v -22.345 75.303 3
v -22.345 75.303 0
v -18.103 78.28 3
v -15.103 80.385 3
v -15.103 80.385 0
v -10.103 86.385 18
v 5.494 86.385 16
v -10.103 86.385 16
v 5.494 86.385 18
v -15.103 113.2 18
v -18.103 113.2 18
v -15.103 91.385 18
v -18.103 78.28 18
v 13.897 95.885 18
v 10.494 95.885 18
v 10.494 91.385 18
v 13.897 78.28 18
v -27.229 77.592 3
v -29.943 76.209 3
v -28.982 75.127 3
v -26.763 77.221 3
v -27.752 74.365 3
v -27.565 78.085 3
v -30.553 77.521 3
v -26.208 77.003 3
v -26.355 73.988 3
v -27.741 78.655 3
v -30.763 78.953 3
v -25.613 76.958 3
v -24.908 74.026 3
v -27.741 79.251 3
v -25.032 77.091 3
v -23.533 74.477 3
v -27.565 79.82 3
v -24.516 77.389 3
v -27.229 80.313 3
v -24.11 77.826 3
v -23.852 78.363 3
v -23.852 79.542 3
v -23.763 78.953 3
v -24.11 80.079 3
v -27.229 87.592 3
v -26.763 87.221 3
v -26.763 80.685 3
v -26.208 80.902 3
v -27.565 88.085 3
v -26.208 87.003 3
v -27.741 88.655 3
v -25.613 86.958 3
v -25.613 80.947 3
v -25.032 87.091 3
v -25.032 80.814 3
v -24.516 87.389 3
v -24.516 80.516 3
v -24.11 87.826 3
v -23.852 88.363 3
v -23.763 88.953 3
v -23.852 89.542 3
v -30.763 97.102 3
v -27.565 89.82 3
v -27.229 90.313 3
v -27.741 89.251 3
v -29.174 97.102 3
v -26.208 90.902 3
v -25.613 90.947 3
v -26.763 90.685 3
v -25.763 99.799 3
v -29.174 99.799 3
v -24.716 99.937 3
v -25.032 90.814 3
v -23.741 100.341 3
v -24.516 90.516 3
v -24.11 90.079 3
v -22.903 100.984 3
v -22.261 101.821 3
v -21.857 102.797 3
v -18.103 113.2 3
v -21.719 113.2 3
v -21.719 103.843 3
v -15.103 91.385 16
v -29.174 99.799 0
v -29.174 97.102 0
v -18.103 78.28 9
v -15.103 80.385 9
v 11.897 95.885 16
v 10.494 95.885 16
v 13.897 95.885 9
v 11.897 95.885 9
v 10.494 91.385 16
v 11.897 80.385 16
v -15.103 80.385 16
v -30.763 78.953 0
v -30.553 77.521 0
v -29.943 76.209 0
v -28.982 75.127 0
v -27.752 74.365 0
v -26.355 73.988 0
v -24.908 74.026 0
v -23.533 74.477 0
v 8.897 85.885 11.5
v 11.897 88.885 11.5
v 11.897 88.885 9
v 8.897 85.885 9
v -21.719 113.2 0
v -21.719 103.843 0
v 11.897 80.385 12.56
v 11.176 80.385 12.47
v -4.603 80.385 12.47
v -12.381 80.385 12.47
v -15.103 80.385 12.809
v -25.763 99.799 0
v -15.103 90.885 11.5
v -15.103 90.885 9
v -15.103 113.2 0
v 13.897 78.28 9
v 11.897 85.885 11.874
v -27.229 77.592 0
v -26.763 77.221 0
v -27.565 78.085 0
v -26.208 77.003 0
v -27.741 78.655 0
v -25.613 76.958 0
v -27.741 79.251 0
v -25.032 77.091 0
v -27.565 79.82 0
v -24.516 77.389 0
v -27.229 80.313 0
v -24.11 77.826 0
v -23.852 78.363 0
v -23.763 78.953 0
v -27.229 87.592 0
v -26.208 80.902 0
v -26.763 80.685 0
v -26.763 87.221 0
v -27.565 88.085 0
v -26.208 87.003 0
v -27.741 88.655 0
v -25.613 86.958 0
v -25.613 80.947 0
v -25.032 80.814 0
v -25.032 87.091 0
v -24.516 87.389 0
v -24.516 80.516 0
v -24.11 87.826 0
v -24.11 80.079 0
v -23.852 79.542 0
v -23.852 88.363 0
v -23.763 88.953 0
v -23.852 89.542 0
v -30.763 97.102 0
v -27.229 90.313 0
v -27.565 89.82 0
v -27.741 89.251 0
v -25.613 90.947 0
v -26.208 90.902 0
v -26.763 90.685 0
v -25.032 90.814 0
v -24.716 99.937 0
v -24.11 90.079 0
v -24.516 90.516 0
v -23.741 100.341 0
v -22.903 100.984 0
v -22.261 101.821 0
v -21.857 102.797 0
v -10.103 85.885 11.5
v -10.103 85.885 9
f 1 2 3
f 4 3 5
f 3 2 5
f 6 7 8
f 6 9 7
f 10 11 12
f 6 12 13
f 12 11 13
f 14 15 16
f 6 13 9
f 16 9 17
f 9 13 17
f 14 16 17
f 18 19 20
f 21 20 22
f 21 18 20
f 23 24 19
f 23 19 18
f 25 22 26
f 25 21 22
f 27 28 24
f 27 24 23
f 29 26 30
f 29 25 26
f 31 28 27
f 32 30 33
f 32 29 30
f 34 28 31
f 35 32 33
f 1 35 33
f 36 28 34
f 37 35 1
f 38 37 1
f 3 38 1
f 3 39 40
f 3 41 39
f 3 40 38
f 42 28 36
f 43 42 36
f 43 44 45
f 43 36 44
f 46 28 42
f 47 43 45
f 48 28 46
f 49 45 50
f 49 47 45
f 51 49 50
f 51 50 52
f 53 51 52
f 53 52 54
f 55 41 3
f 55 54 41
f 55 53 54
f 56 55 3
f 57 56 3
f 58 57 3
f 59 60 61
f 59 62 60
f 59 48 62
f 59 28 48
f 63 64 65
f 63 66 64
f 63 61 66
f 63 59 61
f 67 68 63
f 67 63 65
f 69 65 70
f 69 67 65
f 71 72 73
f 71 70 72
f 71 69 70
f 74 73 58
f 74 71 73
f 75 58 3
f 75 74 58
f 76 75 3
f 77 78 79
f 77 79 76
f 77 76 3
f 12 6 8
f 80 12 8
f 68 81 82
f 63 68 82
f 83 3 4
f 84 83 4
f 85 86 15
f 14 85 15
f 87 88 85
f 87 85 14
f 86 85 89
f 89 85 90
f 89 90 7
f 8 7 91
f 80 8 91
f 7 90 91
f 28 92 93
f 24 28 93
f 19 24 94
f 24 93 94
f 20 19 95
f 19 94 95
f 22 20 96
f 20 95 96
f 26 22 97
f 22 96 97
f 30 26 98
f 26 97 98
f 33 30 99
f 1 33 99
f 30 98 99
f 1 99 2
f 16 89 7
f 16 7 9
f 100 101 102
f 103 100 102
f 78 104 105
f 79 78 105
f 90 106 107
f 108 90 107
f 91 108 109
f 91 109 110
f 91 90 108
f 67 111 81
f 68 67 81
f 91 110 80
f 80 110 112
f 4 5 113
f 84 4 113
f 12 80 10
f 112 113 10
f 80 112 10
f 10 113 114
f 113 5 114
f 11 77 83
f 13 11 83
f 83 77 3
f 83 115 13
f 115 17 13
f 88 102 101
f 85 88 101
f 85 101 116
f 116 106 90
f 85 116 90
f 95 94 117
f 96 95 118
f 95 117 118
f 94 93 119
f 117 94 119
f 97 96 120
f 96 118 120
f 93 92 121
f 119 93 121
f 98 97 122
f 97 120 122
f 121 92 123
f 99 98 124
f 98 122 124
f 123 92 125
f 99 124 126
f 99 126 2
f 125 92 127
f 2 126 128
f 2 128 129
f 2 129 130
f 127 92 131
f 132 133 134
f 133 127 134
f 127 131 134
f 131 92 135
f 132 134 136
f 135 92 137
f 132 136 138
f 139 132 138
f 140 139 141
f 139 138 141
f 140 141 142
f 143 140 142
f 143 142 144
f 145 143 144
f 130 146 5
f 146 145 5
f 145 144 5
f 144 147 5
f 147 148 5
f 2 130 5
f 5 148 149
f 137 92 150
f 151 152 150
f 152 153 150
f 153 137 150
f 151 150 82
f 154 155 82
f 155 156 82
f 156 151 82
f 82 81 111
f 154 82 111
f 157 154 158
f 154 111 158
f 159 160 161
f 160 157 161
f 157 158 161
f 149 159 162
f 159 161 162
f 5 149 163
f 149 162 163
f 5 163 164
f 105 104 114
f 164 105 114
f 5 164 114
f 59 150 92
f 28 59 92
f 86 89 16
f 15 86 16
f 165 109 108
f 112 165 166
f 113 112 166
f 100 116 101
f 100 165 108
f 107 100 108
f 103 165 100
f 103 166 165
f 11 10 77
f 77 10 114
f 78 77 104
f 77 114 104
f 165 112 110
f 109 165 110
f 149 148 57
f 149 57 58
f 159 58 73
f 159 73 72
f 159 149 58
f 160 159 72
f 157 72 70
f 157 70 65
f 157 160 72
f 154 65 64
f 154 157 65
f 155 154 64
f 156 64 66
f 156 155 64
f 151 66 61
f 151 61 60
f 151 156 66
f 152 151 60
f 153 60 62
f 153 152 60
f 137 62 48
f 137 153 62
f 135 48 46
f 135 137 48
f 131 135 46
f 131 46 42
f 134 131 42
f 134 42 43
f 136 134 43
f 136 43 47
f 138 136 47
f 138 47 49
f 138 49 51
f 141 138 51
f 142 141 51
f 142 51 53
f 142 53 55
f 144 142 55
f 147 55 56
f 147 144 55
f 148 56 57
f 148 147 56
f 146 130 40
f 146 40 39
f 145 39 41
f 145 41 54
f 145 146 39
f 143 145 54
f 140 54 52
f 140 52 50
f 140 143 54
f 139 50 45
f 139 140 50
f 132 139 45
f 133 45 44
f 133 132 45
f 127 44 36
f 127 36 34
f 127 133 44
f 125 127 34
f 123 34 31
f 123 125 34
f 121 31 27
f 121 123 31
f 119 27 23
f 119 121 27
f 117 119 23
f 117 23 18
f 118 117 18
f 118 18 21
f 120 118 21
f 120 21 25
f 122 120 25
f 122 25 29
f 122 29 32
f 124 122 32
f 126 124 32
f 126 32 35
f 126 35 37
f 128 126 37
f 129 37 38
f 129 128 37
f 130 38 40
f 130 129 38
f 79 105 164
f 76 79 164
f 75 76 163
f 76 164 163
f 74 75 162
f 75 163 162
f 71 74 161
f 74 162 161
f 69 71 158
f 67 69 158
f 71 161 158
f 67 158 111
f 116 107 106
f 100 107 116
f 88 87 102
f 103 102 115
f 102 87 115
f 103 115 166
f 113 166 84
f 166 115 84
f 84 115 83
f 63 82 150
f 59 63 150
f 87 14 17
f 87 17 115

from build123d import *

# Parameters (mm, degrees)
SKETCH_1_R       = 2
EXTRUDE_1_DEPTH  = 3
EXTRUDE_2_DEPTH  = 15
SKETCH_3_W       = 2
SKETCH_3_H       = 6
EXTRUDE_3_DEPTH  = 29
SKETCH_5_W       = 2
SKETCH_5_H       = 6
EXTRUDE_4_DEPTH  = 7
SKETCH_6_W       = 32
SKETCH_6_H       = 7
EXTRUDE_5_DEPTH  = 2
CHAMFER_1_SIZE   = 5
SKETCH_8_W       = 32
SKETCH_8_H       = 2.104912686
EXTRUDE_6_DEPTH  = 7
SKETCH_9_W       = 27
SKETCH_9_H       = 4.5
EXTRUDE_7_DEPTH  = 5.5
CHAMFER_2_SIZE   = 5
EXTRUDE_8_DEPTH  = 9.5
CHAMFER_3_SIZE   = 5
CHAMFER_4_SIZE   = 3
CHAMFER_6_SIZE   = 2
CHAMFER_6_SIZE_2 = 11.342563639


with BuildPart() as part:
    # 草图1 → 凸台-拉伸1 (new body)
    with BuildSketch(Plane.XY):
        with BuildLine():
            Line((-22.344972157, 75.303248777), (-15.102670088, 80.384719944))
            Line((-15.102670088, 80.384719944), (-15.102670088, 113.200215401))
            Line((-15.102670088, 113.200215401), (-21.718999147, 113.200215401))
            Line((-21.718999147, 113.200215401), (-21.718999147, 103.843357559))
            ThreePointArc((-21.718999147, 103.843357559), (-22.903426745, 100.983896387), (-25.762887917, 99.799468789))
            Line((-25.762887917, 99.799468789), (-29.17448261, 99.799468789))
            Line((-29.17448261, 99.799468789), (-29.17448261, 97.102223458))
            Line((-29.17448261, 97.102223458), (-30.762887917, 97.102223458))
            Line((-30.762887917, 97.102223458), (-30.762887917, 88.952611989))
            Line((-30.762887917, 88.952611989), (-30.762887917, 78.952611989))
            ThreePointArc((-30.762887917, 78.952611989), (-27.751659045, 74.365151973), (-22.344972157, 75.303248777))
        make_face()
        with Locations((-25.762887917, 88.952611989)):
            Circle(SKETCH_1_R, mode=Mode.SUBTRACT)
        with Locations((-25.762887917, 78.952611989)):
            Circle(SKETCH_1_R, mode=Mode.SUBTRACT)
    extrude(amount=EXTRUDE_1_DEPTH)

    # 草图2 → 凸台-拉伸2 (add)
    with BuildSketch(Plane.XY.offset(3)):
        Polygon((-18.102670088, 80.384719944), (-18.102670088, 78.279807258), (-15.102670088, 80.384719944), (-15.102670088, 113.200215401), (-18.102670088, 113.200215401), align=None)
    extrude(amount=EXTRUDE_2_DEPTH)

    # 草图3 → 凸台-拉伸3 (add)
    with BuildSketch(Plane(origin=(-15.102670088, 0, 0), x_dir=(0, 0, -1), z_dir=(1, 0, 0))):
        with Locations((-17, 83.384719944)):
            Rectangle(SKETCH_3_W, SKETCH_3_H)
    extrude(amount=EXTRUDE_3_DEPTH)

    # 草图5 → 凸台-拉伸4 (add)
    with BuildSketch(Plane(origin=(0, 0, 16), x_dir=(-1, 0, 0), z_dir=(0, 0, -1))):
        with Locations((-12.897329912, 83.384719944)):
            Rectangle(SKETCH_5_W, SKETCH_5_H)
    extrude(amount=EXTRUDE_4_DEPTH)

    # 草图6 → 凸台-拉伸5 (add)
    with BuildSketch(Plane.XY.offset(18)):
        with Locations((-2.102670088, 81.779807258)):
            Rectangle(SKETCH_6_W, SKETCH_6_H)
    extrude(amount=-EXTRUDE_5_DEPTH)

    # 倒角1
    chamfer_1_edges = [part.edges().sort_by_distance(p)[0] for p in [
        (-15.102670088, 86.384719944, 17),
    ]]
    chamfer(chamfer_1_edges, length=CHAMFER_1_SIZE)

    # 草图8 → 凸台-拉伸6 (add)
    with BuildSketch(Plane(origin=(0, 0, 16), x_dir=(-1, 0, 0), z_dir=(0, 0, -1))):
        with Locations((2.102670088, 79.332263601)):
            Rectangle(SKETCH_8_W, SKETCH_8_H)
    extrude(amount=EXTRUDE_6_DEPTH)

    # 草图9 → 凸台-拉伸7 (add)
    with BuildSketch(Plane(origin=(0, 80.384719944, 0), x_dir=(1, 0, 0), z_dir=(0, 1, 0))):
        with Locations((-1.602670088, -11.25)):
            Rectangle(SKETCH_9_W, SKETCH_9_H)
    extrude(amount=EXTRUDE_7_DEPTH)

    # 倒角2
    chamfer_2_edges = [part.edges().sort_by_distance(p)[0] for p in [
        (-15.102670088, 85.884719944, 11.25),
    ]]
    chamfer(chamfer_2_edges, length=CHAMFER_2_SIZE)

    # 草图10 → 凸台-拉伸8 (add)
    with BuildSketch(Plane(origin=(0, 86.384719944, 0), x_dir=(1, 0, 0), z_dir=(0, 1, 0))):
        Polygon((11.897329912, -9), (11.897329912, -16), (10.494123617, -16), (10.494123617, -18), (11.897329912, -18), (13.897329912, -18), (13.897329912, -9), align=None)
    extrude(amount=EXTRUDE_8_DEPTH)

    # 倒角3
    chamfer_3_edges = [part.edges().sort_by_distance(p)[0] for p in [
        (10.494123617, 86.384719944, 17),
    ]]
    chamfer(chamfer_3_edges, length=CHAMFER_3_SIZE)

    # 倒角4
    chamfer_4_edges = [part.edges().sort_by_distance(p)[0] for p in [
        (11.897329912, 85.884719944, 11.25),
    ]]
    chamfer(chamfer_4_edges, length=CHAMFER_4_SIZE)

    # 倒角6
    # the kernel refuses this chamfer: 11.342563639, 2 mm, written as the material it takes off along each edge
    with BuildSketch(Plane(origin=(-35.944000175, 111.726050031, 13.5), x_dir=(0, 0, -1), z_dir=(0.7071067811865472, -0.7071067811865478, 0))) as chamfer_6_piece_1_section:
        Polygon((CHAMFER_6_SIZE, 0), (0, -CHAMFER_6_SIZE_2), (0, 0), align=None)
    chamfer_6_piece_1 = extrude(amount=66.019251147, mode=Mode.PRIVATE)
    chamfer_6_piece_1 = split(chamfer_6_piece_1, bisect_by=Plane(origin=(-15.102670088, 111.726050031, 13.5), z_dir=(1, 0, 0)), keep=Keep.TOP, mode=Mode.PRIVATE)
    chamfer_6_piece_1 = split(chamfer_6_piece_1, bisect_by=Plane(origin=(-35.944000175, 80.384719944, 13.5), z_dir=(0, 1, 0)), keep=Keep.TOP, mode=Mode.PRIVATE)
    chamfer_6_piece_1 = split(chamfer_6_piece_1, bisect_by=Plane(origin=(-35.944000175, 110.604818441, 7.141179669), z_dir=(0, 0.17364817766692733, 0.9848077530122086)), keep=Keep.TOP, mode=Mode.PRIVATE)
    add(chamfer_6_piece_1, mode=Mode.SUBTRACT)
    with BuildSketch(Plane(origin=(-39.576761755, 85.884719944, 13.5), x_dir=(0, 0, -1), z_dir=(1, 0, 0))) as chamfer_6_piece_2_section:
        Polygon((CHAMFER_6_SIZE, 0), (0, -CHAMFER_6_SIZE_2), (0, 0), align=None)
    chamfer_6_piece_2 = extrude(amount=77.948183335, mode=Mode.PRIVATE)
    chamfer_6_piece_2 = split(chamfer_6_piece_2, bisect_by=Plane(origin=(11.897329912, 85.884719944, 13.5), z_dir=(-1, 0, 0)), keep=Keep.TOP, mode=Mode.PRIVATE)
    chamfer_6_piece_2 = split(chamfer_6_piece_2, bisect_by=Plane(origin=(-15.102670088, 85.884719944, 13.5), z_dir=(1, 0, 0)), keep=Keep.TOP, mode=Mode.PRIVATE)
    chamfer_6_piece_2 = split(chamfer_6_piece_2, bisect_by=Plane(origin=(-39.576761755, 80.384719944, 13.5), z_dir=(0, 1, 0)), keep=Keep.TOP, mode=Mode.PRIVATE)
    chamfer_6_piece_2 = split(chamfer_6_piece_2, bisect_by=Plane(origin=(-39.374230212, 86.087251487, 15.124384731), z_dir=(0.12278780396897075, 0.12278780396897053, 0.9848077530122088)), keep=Keep.TOP, mode=Mode.PRIVATE)
    chamfer_6_piece_2 = split(chamfer_6_piece_2, bisect_by=Plane(origin=(-38.604080635, 84.912038824, 5.698704782), z_dir=(-0.12278780396897096, 0.12278780396897111, 0.9848077530122086)), keep=Keep.TOP, mode=Mode.PRIVATE)
    add(chamfer_6_piece_2, mode=Mode.SUBTRACT)
    with BuildSketch(Plane(origin=(32.73866, 109.726050031, 13.5), x_dir=(0.7071067811865475, -0.7071067811865475, 0), z_dir=(-0.7071067811865476, -0.7071067811865476, 0))) as chamfer_6_piece_3_section:
        Polygon((CHAMFER_6_SIZE_2, 0), (0, -CHAMFER_6_SIZE), (0, 0), align=None)
    chamfer_6_piece_3 = extrude(amount=63.190824022, mode=Mode.PRIVATE)
    chamfer_6_piece_3 = split(chamfer_6_piece_3, bisect_by=Plane(origin=(11.897329912, 109.726050031, 13.5), z_dir=(-1, 0, 0)), keep=Keep.TOP, mode=Mode.PRIVATE)
    chamfer_6_piece_3 = split(chamfer_6_piece_3, bisect_by=Plane(origin=(32.73866, 80.384719944, 13.5), z_dir=(0, 1, 0)), keep=Keep.TOP, mode=Mode.PRIVATE)
    chamfer_6_piece_3 = split(chamfer_6_piece_3, bisect_by=Plane(origin=(32.73866, 108.665125821, 7.483199812), z_dir=(0, 0.17364817766692733, 0.9848077530122086)), keep=Keep.TOP, mode=Mode.PRIVATE)
    add(chamfer_6_piece_3, mode=Mode.SUBTRACT)


solid = part.part
